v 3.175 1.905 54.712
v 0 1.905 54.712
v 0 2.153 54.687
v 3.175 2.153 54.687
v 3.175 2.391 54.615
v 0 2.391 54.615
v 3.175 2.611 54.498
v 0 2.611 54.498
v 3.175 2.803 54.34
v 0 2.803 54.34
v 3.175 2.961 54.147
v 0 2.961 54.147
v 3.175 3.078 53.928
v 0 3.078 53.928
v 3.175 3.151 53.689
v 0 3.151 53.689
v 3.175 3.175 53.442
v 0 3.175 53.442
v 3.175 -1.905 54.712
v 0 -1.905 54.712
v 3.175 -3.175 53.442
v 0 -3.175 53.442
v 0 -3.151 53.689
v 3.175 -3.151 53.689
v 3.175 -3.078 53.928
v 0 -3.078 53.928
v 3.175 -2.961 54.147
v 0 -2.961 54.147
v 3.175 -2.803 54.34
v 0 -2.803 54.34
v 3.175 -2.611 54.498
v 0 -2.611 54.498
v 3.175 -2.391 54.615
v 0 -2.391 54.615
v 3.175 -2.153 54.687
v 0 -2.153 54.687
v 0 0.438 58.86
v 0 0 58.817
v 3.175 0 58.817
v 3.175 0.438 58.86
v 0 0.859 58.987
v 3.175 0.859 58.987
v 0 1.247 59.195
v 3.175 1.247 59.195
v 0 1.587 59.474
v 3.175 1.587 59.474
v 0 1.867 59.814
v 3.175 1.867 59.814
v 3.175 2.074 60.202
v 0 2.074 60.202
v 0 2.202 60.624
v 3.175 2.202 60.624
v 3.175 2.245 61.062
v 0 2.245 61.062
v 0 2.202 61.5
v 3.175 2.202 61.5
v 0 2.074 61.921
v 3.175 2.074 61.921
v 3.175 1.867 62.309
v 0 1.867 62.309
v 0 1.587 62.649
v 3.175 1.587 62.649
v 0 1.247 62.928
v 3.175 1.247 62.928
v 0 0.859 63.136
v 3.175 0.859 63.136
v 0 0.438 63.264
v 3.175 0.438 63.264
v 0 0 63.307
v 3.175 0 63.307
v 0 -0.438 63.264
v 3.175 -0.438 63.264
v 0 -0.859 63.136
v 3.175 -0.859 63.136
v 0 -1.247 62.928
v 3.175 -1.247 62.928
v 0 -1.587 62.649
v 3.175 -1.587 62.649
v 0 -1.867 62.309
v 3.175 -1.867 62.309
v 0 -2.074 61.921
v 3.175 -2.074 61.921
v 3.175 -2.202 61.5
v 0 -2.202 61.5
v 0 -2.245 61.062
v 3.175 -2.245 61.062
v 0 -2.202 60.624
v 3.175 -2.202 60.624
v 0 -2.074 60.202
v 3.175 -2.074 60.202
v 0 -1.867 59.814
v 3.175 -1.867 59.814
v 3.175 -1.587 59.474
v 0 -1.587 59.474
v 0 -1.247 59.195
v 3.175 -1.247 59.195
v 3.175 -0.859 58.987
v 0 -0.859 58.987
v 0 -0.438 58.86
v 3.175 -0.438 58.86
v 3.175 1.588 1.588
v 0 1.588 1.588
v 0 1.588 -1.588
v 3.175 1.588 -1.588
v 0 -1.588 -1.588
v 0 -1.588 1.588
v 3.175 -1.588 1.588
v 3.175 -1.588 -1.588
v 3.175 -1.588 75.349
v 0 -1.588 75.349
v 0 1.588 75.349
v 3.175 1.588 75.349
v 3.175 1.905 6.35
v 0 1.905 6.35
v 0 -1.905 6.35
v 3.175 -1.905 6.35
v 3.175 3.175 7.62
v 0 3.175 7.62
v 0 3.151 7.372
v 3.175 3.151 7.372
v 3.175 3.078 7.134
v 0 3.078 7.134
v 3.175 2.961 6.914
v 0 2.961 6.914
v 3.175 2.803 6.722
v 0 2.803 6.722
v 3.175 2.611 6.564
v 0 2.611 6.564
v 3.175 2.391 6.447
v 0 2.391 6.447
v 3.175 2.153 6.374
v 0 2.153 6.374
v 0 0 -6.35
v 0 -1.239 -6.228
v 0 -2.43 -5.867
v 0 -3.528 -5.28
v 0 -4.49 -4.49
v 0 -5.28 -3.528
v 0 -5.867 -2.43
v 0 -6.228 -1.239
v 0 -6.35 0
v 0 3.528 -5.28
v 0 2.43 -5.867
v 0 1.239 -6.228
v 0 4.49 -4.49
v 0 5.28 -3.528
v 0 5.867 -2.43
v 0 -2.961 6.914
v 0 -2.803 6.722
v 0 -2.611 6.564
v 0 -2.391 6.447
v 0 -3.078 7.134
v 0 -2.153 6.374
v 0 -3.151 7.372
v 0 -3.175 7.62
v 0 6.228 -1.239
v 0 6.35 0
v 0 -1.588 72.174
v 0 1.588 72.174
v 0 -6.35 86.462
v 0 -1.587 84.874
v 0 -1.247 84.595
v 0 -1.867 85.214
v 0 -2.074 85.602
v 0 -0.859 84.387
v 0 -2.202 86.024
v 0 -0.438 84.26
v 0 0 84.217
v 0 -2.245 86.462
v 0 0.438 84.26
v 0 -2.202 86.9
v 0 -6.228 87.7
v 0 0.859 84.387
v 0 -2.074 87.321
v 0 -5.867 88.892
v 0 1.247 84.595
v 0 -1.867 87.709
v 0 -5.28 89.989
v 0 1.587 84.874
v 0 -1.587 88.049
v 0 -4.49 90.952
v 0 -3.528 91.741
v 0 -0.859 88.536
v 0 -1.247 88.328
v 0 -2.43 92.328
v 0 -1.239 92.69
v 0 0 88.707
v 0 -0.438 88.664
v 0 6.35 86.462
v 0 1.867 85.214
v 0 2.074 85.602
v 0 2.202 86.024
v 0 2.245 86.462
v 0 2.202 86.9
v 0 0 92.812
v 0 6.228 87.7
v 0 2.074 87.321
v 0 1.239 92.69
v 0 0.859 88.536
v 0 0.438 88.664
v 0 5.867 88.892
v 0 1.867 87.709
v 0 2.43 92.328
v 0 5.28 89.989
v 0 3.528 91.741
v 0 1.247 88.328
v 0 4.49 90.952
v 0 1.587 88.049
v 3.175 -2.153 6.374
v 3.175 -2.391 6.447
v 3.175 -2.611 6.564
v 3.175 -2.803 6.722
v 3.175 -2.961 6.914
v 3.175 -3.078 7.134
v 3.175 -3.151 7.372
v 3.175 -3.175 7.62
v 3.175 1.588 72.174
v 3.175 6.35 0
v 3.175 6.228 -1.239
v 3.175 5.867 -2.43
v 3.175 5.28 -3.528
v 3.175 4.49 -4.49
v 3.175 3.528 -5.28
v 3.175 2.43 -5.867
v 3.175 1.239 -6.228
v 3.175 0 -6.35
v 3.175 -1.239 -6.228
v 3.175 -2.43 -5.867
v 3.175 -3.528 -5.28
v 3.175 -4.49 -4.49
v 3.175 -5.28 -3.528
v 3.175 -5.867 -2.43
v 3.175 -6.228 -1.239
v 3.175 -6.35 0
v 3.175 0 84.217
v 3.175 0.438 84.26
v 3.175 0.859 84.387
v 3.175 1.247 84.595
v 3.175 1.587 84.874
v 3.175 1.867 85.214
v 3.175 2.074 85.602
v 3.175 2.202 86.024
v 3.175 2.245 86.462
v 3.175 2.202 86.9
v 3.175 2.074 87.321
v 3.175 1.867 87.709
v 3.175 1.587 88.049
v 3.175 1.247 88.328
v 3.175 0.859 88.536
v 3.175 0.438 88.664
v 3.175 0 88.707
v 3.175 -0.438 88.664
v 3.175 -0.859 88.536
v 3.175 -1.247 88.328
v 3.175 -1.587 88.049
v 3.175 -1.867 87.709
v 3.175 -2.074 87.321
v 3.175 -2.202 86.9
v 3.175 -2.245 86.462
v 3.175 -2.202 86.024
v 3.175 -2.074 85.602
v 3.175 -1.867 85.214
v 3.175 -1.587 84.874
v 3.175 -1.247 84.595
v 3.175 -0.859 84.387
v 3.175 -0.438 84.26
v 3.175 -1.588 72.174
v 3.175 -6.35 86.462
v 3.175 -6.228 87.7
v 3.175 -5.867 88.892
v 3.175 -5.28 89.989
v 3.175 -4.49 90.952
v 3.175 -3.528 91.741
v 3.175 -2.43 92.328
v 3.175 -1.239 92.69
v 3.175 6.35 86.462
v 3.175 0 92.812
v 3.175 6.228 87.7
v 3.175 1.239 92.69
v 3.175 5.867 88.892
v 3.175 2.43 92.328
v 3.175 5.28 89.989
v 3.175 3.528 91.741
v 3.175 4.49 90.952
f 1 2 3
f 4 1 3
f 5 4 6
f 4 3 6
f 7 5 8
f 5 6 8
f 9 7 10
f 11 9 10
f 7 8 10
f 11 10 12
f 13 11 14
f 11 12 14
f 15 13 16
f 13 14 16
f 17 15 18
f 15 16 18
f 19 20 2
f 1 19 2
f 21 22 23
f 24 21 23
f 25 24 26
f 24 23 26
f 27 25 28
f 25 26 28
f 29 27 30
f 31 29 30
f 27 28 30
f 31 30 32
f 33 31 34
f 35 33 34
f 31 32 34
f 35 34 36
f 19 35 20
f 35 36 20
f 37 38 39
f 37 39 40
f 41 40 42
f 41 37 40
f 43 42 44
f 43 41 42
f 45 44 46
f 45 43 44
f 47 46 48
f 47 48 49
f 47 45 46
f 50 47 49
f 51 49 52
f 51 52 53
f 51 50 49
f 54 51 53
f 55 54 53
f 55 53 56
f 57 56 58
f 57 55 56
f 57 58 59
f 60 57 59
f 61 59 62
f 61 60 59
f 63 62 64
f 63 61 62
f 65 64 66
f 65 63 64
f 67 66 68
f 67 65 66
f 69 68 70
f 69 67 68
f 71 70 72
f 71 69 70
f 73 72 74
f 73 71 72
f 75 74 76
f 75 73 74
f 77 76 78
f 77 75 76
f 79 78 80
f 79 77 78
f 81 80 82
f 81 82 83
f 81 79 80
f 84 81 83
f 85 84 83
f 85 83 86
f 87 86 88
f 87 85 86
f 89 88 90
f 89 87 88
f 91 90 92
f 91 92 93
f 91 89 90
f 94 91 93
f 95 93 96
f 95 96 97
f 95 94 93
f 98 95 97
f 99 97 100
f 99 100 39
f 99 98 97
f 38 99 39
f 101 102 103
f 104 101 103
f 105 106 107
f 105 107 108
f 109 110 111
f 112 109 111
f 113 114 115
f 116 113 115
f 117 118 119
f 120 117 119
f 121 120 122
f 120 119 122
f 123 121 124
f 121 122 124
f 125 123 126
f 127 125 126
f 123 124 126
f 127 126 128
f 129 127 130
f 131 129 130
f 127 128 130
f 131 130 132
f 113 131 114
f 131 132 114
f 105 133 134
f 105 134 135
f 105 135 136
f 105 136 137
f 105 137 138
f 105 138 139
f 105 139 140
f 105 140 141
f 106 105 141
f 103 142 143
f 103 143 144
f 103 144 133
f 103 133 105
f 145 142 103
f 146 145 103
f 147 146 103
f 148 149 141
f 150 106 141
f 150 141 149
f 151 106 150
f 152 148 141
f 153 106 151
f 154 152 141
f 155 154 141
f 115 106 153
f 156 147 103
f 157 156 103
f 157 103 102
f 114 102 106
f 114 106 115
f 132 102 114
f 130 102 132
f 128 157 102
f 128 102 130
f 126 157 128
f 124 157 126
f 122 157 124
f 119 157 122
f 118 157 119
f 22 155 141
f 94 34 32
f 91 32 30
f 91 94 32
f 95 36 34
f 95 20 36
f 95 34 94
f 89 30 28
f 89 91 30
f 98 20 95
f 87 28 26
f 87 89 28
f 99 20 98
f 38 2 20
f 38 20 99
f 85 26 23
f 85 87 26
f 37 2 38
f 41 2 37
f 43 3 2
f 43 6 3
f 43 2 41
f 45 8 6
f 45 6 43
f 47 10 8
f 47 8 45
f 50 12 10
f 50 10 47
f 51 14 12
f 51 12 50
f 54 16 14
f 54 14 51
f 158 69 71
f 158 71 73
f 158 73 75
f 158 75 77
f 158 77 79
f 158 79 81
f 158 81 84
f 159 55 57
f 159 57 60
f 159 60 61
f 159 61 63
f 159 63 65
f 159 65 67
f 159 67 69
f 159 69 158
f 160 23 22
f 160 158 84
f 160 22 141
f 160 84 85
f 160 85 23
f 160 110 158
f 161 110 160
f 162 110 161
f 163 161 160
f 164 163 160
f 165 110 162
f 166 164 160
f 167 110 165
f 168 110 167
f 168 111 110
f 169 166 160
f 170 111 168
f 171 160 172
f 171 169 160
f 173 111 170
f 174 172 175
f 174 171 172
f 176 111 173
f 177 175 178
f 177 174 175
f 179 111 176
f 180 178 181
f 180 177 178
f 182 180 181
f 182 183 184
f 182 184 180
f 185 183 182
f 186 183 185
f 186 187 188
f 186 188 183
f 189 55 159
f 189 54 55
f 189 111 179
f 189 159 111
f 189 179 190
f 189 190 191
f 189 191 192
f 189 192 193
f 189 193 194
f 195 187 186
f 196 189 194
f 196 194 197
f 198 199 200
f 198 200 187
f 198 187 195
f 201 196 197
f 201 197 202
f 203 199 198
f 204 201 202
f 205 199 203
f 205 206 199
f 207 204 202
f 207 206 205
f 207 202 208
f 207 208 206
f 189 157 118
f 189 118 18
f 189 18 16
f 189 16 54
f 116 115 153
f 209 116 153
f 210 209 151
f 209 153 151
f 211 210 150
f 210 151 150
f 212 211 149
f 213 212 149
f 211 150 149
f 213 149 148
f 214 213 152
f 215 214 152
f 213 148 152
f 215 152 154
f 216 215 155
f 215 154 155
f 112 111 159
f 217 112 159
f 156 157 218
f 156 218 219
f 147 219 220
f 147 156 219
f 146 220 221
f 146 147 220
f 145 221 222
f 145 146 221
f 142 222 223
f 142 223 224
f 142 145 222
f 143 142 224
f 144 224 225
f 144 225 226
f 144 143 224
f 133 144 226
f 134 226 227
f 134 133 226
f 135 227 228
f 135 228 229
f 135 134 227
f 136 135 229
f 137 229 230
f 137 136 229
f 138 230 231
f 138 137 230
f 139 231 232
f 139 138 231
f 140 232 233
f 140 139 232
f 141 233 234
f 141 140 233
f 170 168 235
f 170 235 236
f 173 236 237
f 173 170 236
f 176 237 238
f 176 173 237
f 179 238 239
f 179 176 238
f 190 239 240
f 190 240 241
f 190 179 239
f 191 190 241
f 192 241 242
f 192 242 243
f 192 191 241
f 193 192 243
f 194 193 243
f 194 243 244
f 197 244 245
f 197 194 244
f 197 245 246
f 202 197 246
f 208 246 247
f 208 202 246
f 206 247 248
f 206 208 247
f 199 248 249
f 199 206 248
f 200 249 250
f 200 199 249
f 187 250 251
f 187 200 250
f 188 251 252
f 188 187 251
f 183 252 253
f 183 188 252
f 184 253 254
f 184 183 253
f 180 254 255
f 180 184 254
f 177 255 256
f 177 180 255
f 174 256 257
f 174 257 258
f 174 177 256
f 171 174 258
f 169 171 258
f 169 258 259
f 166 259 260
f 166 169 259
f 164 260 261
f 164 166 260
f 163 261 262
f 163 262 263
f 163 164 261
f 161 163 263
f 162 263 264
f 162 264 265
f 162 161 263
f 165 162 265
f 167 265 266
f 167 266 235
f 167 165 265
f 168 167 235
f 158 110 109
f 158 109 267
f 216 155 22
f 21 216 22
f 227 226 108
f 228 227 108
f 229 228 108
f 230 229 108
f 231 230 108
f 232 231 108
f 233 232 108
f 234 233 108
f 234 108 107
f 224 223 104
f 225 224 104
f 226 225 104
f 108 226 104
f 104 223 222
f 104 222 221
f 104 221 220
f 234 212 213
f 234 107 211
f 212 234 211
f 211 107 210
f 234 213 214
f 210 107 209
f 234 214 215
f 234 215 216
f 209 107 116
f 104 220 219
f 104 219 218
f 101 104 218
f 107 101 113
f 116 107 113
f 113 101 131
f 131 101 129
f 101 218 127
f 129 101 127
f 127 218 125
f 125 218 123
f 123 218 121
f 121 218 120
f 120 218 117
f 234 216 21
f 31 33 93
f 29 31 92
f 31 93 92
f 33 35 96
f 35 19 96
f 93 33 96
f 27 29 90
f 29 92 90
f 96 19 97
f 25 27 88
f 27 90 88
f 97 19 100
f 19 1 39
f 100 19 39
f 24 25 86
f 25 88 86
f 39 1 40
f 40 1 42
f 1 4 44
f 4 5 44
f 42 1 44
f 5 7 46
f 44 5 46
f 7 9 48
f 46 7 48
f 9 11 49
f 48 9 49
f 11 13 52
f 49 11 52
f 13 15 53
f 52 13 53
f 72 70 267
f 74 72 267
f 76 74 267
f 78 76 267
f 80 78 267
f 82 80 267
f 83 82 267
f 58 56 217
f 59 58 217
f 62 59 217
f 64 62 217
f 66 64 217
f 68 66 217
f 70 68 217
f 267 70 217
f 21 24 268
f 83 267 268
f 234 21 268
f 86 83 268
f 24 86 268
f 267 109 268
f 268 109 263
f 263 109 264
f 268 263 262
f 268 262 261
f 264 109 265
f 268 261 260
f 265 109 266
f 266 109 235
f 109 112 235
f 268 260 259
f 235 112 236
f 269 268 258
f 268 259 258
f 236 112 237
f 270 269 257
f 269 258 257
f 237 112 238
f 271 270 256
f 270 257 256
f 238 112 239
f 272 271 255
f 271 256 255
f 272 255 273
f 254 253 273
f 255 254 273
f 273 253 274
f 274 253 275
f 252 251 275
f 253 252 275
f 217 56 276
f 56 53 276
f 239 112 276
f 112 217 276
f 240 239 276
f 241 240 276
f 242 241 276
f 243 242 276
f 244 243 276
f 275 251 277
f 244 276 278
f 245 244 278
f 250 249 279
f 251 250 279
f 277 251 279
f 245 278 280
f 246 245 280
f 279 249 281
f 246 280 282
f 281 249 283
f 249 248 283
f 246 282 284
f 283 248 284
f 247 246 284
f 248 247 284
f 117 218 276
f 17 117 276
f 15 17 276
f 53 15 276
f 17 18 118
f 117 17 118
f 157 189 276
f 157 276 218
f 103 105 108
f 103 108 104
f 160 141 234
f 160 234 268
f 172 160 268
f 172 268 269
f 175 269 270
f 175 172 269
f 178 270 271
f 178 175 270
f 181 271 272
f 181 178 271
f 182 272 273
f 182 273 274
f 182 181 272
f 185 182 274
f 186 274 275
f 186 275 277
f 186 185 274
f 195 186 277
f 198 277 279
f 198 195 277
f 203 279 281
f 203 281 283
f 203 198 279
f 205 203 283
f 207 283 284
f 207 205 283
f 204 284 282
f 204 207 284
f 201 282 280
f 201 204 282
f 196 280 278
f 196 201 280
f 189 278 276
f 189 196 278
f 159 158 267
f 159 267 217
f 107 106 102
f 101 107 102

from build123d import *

# Parameters (mm, degrees)
SKETCH1_R           = 2.24506403
SKETCH1_W           = 3.175
SKETCH1_H           = 3.175
BOSS_EXTRUDE1_DEPTH = 3.175


with BuildPart() as part:
    # Sketch1 → Boss-Extrude1 (new body)
    with BuildSketch(Plane(origin=(0, 0, 0), x_dir=(0, 0, -1), z_dir=(1, 0, 0))):
        with BuildLine():
            Line((-86.4616, 6.35), (0, 6.35))
            ThreePointArc((0, 6.35), (6.35, 0), (0, -6.35))
            Line((0, -6.35), (-86.4616, -6.35))
            ThreePointArc((-86.4616, -6.35), (-92.8116, 0), (-86.4616, 6.35))
        make_face()
        with Locations((-61.0616, 0)):
            Circle(SKETCH1_R, mode=Mode.SUBTRACT)
        with Locations((-86.4616, 0)):
            Circle(SKETCH1_R, mode=Mode.SUBTRACT)
        with Locations((-73.7616, 0)):
            Rectangle(SKETCH1_W, SKETCH1_H, mode=Mode.SUBTRACT)
        with BuildLine():
            Line((-54.7116, 0), (-54.7116, 1.905))
            ThreePointArc((-54.7116, 1.905), (-54.339625612, 2.803025612), (-53.4416, 3.175))
            Line((-53.4416, 3.175), (-7.62, 3.175))
            ThreePointArc((-7.62, 3.175), (-6.721974388, 2.803025612), (-6.35, 1.905))
            Line((-6.35, 1.905), (-6.35, -1.905))
            ThreePointArc((-6.35, -1.905), (-6.721974388, -2.803025612), (-7.62, -3.175))
            Line((-7.62, -3.175), (-53.4416, -3.175))
            ThreePointArc((-53.4416, -3.175), (-54.339625612, -2.803025612), (-54.7116, -1.905))
            Line((-54.7116, -1.905), (-54.7116, 0))
        make_face(mode=Mode.SUBTRACT)
        Rectangle(SKETCH1_W, SKETCH1_H, mode=Mode.SUBTRACT)
    extrude(amount=BOSS_EXTRUDE1_DEPTH)


solid = part.part
